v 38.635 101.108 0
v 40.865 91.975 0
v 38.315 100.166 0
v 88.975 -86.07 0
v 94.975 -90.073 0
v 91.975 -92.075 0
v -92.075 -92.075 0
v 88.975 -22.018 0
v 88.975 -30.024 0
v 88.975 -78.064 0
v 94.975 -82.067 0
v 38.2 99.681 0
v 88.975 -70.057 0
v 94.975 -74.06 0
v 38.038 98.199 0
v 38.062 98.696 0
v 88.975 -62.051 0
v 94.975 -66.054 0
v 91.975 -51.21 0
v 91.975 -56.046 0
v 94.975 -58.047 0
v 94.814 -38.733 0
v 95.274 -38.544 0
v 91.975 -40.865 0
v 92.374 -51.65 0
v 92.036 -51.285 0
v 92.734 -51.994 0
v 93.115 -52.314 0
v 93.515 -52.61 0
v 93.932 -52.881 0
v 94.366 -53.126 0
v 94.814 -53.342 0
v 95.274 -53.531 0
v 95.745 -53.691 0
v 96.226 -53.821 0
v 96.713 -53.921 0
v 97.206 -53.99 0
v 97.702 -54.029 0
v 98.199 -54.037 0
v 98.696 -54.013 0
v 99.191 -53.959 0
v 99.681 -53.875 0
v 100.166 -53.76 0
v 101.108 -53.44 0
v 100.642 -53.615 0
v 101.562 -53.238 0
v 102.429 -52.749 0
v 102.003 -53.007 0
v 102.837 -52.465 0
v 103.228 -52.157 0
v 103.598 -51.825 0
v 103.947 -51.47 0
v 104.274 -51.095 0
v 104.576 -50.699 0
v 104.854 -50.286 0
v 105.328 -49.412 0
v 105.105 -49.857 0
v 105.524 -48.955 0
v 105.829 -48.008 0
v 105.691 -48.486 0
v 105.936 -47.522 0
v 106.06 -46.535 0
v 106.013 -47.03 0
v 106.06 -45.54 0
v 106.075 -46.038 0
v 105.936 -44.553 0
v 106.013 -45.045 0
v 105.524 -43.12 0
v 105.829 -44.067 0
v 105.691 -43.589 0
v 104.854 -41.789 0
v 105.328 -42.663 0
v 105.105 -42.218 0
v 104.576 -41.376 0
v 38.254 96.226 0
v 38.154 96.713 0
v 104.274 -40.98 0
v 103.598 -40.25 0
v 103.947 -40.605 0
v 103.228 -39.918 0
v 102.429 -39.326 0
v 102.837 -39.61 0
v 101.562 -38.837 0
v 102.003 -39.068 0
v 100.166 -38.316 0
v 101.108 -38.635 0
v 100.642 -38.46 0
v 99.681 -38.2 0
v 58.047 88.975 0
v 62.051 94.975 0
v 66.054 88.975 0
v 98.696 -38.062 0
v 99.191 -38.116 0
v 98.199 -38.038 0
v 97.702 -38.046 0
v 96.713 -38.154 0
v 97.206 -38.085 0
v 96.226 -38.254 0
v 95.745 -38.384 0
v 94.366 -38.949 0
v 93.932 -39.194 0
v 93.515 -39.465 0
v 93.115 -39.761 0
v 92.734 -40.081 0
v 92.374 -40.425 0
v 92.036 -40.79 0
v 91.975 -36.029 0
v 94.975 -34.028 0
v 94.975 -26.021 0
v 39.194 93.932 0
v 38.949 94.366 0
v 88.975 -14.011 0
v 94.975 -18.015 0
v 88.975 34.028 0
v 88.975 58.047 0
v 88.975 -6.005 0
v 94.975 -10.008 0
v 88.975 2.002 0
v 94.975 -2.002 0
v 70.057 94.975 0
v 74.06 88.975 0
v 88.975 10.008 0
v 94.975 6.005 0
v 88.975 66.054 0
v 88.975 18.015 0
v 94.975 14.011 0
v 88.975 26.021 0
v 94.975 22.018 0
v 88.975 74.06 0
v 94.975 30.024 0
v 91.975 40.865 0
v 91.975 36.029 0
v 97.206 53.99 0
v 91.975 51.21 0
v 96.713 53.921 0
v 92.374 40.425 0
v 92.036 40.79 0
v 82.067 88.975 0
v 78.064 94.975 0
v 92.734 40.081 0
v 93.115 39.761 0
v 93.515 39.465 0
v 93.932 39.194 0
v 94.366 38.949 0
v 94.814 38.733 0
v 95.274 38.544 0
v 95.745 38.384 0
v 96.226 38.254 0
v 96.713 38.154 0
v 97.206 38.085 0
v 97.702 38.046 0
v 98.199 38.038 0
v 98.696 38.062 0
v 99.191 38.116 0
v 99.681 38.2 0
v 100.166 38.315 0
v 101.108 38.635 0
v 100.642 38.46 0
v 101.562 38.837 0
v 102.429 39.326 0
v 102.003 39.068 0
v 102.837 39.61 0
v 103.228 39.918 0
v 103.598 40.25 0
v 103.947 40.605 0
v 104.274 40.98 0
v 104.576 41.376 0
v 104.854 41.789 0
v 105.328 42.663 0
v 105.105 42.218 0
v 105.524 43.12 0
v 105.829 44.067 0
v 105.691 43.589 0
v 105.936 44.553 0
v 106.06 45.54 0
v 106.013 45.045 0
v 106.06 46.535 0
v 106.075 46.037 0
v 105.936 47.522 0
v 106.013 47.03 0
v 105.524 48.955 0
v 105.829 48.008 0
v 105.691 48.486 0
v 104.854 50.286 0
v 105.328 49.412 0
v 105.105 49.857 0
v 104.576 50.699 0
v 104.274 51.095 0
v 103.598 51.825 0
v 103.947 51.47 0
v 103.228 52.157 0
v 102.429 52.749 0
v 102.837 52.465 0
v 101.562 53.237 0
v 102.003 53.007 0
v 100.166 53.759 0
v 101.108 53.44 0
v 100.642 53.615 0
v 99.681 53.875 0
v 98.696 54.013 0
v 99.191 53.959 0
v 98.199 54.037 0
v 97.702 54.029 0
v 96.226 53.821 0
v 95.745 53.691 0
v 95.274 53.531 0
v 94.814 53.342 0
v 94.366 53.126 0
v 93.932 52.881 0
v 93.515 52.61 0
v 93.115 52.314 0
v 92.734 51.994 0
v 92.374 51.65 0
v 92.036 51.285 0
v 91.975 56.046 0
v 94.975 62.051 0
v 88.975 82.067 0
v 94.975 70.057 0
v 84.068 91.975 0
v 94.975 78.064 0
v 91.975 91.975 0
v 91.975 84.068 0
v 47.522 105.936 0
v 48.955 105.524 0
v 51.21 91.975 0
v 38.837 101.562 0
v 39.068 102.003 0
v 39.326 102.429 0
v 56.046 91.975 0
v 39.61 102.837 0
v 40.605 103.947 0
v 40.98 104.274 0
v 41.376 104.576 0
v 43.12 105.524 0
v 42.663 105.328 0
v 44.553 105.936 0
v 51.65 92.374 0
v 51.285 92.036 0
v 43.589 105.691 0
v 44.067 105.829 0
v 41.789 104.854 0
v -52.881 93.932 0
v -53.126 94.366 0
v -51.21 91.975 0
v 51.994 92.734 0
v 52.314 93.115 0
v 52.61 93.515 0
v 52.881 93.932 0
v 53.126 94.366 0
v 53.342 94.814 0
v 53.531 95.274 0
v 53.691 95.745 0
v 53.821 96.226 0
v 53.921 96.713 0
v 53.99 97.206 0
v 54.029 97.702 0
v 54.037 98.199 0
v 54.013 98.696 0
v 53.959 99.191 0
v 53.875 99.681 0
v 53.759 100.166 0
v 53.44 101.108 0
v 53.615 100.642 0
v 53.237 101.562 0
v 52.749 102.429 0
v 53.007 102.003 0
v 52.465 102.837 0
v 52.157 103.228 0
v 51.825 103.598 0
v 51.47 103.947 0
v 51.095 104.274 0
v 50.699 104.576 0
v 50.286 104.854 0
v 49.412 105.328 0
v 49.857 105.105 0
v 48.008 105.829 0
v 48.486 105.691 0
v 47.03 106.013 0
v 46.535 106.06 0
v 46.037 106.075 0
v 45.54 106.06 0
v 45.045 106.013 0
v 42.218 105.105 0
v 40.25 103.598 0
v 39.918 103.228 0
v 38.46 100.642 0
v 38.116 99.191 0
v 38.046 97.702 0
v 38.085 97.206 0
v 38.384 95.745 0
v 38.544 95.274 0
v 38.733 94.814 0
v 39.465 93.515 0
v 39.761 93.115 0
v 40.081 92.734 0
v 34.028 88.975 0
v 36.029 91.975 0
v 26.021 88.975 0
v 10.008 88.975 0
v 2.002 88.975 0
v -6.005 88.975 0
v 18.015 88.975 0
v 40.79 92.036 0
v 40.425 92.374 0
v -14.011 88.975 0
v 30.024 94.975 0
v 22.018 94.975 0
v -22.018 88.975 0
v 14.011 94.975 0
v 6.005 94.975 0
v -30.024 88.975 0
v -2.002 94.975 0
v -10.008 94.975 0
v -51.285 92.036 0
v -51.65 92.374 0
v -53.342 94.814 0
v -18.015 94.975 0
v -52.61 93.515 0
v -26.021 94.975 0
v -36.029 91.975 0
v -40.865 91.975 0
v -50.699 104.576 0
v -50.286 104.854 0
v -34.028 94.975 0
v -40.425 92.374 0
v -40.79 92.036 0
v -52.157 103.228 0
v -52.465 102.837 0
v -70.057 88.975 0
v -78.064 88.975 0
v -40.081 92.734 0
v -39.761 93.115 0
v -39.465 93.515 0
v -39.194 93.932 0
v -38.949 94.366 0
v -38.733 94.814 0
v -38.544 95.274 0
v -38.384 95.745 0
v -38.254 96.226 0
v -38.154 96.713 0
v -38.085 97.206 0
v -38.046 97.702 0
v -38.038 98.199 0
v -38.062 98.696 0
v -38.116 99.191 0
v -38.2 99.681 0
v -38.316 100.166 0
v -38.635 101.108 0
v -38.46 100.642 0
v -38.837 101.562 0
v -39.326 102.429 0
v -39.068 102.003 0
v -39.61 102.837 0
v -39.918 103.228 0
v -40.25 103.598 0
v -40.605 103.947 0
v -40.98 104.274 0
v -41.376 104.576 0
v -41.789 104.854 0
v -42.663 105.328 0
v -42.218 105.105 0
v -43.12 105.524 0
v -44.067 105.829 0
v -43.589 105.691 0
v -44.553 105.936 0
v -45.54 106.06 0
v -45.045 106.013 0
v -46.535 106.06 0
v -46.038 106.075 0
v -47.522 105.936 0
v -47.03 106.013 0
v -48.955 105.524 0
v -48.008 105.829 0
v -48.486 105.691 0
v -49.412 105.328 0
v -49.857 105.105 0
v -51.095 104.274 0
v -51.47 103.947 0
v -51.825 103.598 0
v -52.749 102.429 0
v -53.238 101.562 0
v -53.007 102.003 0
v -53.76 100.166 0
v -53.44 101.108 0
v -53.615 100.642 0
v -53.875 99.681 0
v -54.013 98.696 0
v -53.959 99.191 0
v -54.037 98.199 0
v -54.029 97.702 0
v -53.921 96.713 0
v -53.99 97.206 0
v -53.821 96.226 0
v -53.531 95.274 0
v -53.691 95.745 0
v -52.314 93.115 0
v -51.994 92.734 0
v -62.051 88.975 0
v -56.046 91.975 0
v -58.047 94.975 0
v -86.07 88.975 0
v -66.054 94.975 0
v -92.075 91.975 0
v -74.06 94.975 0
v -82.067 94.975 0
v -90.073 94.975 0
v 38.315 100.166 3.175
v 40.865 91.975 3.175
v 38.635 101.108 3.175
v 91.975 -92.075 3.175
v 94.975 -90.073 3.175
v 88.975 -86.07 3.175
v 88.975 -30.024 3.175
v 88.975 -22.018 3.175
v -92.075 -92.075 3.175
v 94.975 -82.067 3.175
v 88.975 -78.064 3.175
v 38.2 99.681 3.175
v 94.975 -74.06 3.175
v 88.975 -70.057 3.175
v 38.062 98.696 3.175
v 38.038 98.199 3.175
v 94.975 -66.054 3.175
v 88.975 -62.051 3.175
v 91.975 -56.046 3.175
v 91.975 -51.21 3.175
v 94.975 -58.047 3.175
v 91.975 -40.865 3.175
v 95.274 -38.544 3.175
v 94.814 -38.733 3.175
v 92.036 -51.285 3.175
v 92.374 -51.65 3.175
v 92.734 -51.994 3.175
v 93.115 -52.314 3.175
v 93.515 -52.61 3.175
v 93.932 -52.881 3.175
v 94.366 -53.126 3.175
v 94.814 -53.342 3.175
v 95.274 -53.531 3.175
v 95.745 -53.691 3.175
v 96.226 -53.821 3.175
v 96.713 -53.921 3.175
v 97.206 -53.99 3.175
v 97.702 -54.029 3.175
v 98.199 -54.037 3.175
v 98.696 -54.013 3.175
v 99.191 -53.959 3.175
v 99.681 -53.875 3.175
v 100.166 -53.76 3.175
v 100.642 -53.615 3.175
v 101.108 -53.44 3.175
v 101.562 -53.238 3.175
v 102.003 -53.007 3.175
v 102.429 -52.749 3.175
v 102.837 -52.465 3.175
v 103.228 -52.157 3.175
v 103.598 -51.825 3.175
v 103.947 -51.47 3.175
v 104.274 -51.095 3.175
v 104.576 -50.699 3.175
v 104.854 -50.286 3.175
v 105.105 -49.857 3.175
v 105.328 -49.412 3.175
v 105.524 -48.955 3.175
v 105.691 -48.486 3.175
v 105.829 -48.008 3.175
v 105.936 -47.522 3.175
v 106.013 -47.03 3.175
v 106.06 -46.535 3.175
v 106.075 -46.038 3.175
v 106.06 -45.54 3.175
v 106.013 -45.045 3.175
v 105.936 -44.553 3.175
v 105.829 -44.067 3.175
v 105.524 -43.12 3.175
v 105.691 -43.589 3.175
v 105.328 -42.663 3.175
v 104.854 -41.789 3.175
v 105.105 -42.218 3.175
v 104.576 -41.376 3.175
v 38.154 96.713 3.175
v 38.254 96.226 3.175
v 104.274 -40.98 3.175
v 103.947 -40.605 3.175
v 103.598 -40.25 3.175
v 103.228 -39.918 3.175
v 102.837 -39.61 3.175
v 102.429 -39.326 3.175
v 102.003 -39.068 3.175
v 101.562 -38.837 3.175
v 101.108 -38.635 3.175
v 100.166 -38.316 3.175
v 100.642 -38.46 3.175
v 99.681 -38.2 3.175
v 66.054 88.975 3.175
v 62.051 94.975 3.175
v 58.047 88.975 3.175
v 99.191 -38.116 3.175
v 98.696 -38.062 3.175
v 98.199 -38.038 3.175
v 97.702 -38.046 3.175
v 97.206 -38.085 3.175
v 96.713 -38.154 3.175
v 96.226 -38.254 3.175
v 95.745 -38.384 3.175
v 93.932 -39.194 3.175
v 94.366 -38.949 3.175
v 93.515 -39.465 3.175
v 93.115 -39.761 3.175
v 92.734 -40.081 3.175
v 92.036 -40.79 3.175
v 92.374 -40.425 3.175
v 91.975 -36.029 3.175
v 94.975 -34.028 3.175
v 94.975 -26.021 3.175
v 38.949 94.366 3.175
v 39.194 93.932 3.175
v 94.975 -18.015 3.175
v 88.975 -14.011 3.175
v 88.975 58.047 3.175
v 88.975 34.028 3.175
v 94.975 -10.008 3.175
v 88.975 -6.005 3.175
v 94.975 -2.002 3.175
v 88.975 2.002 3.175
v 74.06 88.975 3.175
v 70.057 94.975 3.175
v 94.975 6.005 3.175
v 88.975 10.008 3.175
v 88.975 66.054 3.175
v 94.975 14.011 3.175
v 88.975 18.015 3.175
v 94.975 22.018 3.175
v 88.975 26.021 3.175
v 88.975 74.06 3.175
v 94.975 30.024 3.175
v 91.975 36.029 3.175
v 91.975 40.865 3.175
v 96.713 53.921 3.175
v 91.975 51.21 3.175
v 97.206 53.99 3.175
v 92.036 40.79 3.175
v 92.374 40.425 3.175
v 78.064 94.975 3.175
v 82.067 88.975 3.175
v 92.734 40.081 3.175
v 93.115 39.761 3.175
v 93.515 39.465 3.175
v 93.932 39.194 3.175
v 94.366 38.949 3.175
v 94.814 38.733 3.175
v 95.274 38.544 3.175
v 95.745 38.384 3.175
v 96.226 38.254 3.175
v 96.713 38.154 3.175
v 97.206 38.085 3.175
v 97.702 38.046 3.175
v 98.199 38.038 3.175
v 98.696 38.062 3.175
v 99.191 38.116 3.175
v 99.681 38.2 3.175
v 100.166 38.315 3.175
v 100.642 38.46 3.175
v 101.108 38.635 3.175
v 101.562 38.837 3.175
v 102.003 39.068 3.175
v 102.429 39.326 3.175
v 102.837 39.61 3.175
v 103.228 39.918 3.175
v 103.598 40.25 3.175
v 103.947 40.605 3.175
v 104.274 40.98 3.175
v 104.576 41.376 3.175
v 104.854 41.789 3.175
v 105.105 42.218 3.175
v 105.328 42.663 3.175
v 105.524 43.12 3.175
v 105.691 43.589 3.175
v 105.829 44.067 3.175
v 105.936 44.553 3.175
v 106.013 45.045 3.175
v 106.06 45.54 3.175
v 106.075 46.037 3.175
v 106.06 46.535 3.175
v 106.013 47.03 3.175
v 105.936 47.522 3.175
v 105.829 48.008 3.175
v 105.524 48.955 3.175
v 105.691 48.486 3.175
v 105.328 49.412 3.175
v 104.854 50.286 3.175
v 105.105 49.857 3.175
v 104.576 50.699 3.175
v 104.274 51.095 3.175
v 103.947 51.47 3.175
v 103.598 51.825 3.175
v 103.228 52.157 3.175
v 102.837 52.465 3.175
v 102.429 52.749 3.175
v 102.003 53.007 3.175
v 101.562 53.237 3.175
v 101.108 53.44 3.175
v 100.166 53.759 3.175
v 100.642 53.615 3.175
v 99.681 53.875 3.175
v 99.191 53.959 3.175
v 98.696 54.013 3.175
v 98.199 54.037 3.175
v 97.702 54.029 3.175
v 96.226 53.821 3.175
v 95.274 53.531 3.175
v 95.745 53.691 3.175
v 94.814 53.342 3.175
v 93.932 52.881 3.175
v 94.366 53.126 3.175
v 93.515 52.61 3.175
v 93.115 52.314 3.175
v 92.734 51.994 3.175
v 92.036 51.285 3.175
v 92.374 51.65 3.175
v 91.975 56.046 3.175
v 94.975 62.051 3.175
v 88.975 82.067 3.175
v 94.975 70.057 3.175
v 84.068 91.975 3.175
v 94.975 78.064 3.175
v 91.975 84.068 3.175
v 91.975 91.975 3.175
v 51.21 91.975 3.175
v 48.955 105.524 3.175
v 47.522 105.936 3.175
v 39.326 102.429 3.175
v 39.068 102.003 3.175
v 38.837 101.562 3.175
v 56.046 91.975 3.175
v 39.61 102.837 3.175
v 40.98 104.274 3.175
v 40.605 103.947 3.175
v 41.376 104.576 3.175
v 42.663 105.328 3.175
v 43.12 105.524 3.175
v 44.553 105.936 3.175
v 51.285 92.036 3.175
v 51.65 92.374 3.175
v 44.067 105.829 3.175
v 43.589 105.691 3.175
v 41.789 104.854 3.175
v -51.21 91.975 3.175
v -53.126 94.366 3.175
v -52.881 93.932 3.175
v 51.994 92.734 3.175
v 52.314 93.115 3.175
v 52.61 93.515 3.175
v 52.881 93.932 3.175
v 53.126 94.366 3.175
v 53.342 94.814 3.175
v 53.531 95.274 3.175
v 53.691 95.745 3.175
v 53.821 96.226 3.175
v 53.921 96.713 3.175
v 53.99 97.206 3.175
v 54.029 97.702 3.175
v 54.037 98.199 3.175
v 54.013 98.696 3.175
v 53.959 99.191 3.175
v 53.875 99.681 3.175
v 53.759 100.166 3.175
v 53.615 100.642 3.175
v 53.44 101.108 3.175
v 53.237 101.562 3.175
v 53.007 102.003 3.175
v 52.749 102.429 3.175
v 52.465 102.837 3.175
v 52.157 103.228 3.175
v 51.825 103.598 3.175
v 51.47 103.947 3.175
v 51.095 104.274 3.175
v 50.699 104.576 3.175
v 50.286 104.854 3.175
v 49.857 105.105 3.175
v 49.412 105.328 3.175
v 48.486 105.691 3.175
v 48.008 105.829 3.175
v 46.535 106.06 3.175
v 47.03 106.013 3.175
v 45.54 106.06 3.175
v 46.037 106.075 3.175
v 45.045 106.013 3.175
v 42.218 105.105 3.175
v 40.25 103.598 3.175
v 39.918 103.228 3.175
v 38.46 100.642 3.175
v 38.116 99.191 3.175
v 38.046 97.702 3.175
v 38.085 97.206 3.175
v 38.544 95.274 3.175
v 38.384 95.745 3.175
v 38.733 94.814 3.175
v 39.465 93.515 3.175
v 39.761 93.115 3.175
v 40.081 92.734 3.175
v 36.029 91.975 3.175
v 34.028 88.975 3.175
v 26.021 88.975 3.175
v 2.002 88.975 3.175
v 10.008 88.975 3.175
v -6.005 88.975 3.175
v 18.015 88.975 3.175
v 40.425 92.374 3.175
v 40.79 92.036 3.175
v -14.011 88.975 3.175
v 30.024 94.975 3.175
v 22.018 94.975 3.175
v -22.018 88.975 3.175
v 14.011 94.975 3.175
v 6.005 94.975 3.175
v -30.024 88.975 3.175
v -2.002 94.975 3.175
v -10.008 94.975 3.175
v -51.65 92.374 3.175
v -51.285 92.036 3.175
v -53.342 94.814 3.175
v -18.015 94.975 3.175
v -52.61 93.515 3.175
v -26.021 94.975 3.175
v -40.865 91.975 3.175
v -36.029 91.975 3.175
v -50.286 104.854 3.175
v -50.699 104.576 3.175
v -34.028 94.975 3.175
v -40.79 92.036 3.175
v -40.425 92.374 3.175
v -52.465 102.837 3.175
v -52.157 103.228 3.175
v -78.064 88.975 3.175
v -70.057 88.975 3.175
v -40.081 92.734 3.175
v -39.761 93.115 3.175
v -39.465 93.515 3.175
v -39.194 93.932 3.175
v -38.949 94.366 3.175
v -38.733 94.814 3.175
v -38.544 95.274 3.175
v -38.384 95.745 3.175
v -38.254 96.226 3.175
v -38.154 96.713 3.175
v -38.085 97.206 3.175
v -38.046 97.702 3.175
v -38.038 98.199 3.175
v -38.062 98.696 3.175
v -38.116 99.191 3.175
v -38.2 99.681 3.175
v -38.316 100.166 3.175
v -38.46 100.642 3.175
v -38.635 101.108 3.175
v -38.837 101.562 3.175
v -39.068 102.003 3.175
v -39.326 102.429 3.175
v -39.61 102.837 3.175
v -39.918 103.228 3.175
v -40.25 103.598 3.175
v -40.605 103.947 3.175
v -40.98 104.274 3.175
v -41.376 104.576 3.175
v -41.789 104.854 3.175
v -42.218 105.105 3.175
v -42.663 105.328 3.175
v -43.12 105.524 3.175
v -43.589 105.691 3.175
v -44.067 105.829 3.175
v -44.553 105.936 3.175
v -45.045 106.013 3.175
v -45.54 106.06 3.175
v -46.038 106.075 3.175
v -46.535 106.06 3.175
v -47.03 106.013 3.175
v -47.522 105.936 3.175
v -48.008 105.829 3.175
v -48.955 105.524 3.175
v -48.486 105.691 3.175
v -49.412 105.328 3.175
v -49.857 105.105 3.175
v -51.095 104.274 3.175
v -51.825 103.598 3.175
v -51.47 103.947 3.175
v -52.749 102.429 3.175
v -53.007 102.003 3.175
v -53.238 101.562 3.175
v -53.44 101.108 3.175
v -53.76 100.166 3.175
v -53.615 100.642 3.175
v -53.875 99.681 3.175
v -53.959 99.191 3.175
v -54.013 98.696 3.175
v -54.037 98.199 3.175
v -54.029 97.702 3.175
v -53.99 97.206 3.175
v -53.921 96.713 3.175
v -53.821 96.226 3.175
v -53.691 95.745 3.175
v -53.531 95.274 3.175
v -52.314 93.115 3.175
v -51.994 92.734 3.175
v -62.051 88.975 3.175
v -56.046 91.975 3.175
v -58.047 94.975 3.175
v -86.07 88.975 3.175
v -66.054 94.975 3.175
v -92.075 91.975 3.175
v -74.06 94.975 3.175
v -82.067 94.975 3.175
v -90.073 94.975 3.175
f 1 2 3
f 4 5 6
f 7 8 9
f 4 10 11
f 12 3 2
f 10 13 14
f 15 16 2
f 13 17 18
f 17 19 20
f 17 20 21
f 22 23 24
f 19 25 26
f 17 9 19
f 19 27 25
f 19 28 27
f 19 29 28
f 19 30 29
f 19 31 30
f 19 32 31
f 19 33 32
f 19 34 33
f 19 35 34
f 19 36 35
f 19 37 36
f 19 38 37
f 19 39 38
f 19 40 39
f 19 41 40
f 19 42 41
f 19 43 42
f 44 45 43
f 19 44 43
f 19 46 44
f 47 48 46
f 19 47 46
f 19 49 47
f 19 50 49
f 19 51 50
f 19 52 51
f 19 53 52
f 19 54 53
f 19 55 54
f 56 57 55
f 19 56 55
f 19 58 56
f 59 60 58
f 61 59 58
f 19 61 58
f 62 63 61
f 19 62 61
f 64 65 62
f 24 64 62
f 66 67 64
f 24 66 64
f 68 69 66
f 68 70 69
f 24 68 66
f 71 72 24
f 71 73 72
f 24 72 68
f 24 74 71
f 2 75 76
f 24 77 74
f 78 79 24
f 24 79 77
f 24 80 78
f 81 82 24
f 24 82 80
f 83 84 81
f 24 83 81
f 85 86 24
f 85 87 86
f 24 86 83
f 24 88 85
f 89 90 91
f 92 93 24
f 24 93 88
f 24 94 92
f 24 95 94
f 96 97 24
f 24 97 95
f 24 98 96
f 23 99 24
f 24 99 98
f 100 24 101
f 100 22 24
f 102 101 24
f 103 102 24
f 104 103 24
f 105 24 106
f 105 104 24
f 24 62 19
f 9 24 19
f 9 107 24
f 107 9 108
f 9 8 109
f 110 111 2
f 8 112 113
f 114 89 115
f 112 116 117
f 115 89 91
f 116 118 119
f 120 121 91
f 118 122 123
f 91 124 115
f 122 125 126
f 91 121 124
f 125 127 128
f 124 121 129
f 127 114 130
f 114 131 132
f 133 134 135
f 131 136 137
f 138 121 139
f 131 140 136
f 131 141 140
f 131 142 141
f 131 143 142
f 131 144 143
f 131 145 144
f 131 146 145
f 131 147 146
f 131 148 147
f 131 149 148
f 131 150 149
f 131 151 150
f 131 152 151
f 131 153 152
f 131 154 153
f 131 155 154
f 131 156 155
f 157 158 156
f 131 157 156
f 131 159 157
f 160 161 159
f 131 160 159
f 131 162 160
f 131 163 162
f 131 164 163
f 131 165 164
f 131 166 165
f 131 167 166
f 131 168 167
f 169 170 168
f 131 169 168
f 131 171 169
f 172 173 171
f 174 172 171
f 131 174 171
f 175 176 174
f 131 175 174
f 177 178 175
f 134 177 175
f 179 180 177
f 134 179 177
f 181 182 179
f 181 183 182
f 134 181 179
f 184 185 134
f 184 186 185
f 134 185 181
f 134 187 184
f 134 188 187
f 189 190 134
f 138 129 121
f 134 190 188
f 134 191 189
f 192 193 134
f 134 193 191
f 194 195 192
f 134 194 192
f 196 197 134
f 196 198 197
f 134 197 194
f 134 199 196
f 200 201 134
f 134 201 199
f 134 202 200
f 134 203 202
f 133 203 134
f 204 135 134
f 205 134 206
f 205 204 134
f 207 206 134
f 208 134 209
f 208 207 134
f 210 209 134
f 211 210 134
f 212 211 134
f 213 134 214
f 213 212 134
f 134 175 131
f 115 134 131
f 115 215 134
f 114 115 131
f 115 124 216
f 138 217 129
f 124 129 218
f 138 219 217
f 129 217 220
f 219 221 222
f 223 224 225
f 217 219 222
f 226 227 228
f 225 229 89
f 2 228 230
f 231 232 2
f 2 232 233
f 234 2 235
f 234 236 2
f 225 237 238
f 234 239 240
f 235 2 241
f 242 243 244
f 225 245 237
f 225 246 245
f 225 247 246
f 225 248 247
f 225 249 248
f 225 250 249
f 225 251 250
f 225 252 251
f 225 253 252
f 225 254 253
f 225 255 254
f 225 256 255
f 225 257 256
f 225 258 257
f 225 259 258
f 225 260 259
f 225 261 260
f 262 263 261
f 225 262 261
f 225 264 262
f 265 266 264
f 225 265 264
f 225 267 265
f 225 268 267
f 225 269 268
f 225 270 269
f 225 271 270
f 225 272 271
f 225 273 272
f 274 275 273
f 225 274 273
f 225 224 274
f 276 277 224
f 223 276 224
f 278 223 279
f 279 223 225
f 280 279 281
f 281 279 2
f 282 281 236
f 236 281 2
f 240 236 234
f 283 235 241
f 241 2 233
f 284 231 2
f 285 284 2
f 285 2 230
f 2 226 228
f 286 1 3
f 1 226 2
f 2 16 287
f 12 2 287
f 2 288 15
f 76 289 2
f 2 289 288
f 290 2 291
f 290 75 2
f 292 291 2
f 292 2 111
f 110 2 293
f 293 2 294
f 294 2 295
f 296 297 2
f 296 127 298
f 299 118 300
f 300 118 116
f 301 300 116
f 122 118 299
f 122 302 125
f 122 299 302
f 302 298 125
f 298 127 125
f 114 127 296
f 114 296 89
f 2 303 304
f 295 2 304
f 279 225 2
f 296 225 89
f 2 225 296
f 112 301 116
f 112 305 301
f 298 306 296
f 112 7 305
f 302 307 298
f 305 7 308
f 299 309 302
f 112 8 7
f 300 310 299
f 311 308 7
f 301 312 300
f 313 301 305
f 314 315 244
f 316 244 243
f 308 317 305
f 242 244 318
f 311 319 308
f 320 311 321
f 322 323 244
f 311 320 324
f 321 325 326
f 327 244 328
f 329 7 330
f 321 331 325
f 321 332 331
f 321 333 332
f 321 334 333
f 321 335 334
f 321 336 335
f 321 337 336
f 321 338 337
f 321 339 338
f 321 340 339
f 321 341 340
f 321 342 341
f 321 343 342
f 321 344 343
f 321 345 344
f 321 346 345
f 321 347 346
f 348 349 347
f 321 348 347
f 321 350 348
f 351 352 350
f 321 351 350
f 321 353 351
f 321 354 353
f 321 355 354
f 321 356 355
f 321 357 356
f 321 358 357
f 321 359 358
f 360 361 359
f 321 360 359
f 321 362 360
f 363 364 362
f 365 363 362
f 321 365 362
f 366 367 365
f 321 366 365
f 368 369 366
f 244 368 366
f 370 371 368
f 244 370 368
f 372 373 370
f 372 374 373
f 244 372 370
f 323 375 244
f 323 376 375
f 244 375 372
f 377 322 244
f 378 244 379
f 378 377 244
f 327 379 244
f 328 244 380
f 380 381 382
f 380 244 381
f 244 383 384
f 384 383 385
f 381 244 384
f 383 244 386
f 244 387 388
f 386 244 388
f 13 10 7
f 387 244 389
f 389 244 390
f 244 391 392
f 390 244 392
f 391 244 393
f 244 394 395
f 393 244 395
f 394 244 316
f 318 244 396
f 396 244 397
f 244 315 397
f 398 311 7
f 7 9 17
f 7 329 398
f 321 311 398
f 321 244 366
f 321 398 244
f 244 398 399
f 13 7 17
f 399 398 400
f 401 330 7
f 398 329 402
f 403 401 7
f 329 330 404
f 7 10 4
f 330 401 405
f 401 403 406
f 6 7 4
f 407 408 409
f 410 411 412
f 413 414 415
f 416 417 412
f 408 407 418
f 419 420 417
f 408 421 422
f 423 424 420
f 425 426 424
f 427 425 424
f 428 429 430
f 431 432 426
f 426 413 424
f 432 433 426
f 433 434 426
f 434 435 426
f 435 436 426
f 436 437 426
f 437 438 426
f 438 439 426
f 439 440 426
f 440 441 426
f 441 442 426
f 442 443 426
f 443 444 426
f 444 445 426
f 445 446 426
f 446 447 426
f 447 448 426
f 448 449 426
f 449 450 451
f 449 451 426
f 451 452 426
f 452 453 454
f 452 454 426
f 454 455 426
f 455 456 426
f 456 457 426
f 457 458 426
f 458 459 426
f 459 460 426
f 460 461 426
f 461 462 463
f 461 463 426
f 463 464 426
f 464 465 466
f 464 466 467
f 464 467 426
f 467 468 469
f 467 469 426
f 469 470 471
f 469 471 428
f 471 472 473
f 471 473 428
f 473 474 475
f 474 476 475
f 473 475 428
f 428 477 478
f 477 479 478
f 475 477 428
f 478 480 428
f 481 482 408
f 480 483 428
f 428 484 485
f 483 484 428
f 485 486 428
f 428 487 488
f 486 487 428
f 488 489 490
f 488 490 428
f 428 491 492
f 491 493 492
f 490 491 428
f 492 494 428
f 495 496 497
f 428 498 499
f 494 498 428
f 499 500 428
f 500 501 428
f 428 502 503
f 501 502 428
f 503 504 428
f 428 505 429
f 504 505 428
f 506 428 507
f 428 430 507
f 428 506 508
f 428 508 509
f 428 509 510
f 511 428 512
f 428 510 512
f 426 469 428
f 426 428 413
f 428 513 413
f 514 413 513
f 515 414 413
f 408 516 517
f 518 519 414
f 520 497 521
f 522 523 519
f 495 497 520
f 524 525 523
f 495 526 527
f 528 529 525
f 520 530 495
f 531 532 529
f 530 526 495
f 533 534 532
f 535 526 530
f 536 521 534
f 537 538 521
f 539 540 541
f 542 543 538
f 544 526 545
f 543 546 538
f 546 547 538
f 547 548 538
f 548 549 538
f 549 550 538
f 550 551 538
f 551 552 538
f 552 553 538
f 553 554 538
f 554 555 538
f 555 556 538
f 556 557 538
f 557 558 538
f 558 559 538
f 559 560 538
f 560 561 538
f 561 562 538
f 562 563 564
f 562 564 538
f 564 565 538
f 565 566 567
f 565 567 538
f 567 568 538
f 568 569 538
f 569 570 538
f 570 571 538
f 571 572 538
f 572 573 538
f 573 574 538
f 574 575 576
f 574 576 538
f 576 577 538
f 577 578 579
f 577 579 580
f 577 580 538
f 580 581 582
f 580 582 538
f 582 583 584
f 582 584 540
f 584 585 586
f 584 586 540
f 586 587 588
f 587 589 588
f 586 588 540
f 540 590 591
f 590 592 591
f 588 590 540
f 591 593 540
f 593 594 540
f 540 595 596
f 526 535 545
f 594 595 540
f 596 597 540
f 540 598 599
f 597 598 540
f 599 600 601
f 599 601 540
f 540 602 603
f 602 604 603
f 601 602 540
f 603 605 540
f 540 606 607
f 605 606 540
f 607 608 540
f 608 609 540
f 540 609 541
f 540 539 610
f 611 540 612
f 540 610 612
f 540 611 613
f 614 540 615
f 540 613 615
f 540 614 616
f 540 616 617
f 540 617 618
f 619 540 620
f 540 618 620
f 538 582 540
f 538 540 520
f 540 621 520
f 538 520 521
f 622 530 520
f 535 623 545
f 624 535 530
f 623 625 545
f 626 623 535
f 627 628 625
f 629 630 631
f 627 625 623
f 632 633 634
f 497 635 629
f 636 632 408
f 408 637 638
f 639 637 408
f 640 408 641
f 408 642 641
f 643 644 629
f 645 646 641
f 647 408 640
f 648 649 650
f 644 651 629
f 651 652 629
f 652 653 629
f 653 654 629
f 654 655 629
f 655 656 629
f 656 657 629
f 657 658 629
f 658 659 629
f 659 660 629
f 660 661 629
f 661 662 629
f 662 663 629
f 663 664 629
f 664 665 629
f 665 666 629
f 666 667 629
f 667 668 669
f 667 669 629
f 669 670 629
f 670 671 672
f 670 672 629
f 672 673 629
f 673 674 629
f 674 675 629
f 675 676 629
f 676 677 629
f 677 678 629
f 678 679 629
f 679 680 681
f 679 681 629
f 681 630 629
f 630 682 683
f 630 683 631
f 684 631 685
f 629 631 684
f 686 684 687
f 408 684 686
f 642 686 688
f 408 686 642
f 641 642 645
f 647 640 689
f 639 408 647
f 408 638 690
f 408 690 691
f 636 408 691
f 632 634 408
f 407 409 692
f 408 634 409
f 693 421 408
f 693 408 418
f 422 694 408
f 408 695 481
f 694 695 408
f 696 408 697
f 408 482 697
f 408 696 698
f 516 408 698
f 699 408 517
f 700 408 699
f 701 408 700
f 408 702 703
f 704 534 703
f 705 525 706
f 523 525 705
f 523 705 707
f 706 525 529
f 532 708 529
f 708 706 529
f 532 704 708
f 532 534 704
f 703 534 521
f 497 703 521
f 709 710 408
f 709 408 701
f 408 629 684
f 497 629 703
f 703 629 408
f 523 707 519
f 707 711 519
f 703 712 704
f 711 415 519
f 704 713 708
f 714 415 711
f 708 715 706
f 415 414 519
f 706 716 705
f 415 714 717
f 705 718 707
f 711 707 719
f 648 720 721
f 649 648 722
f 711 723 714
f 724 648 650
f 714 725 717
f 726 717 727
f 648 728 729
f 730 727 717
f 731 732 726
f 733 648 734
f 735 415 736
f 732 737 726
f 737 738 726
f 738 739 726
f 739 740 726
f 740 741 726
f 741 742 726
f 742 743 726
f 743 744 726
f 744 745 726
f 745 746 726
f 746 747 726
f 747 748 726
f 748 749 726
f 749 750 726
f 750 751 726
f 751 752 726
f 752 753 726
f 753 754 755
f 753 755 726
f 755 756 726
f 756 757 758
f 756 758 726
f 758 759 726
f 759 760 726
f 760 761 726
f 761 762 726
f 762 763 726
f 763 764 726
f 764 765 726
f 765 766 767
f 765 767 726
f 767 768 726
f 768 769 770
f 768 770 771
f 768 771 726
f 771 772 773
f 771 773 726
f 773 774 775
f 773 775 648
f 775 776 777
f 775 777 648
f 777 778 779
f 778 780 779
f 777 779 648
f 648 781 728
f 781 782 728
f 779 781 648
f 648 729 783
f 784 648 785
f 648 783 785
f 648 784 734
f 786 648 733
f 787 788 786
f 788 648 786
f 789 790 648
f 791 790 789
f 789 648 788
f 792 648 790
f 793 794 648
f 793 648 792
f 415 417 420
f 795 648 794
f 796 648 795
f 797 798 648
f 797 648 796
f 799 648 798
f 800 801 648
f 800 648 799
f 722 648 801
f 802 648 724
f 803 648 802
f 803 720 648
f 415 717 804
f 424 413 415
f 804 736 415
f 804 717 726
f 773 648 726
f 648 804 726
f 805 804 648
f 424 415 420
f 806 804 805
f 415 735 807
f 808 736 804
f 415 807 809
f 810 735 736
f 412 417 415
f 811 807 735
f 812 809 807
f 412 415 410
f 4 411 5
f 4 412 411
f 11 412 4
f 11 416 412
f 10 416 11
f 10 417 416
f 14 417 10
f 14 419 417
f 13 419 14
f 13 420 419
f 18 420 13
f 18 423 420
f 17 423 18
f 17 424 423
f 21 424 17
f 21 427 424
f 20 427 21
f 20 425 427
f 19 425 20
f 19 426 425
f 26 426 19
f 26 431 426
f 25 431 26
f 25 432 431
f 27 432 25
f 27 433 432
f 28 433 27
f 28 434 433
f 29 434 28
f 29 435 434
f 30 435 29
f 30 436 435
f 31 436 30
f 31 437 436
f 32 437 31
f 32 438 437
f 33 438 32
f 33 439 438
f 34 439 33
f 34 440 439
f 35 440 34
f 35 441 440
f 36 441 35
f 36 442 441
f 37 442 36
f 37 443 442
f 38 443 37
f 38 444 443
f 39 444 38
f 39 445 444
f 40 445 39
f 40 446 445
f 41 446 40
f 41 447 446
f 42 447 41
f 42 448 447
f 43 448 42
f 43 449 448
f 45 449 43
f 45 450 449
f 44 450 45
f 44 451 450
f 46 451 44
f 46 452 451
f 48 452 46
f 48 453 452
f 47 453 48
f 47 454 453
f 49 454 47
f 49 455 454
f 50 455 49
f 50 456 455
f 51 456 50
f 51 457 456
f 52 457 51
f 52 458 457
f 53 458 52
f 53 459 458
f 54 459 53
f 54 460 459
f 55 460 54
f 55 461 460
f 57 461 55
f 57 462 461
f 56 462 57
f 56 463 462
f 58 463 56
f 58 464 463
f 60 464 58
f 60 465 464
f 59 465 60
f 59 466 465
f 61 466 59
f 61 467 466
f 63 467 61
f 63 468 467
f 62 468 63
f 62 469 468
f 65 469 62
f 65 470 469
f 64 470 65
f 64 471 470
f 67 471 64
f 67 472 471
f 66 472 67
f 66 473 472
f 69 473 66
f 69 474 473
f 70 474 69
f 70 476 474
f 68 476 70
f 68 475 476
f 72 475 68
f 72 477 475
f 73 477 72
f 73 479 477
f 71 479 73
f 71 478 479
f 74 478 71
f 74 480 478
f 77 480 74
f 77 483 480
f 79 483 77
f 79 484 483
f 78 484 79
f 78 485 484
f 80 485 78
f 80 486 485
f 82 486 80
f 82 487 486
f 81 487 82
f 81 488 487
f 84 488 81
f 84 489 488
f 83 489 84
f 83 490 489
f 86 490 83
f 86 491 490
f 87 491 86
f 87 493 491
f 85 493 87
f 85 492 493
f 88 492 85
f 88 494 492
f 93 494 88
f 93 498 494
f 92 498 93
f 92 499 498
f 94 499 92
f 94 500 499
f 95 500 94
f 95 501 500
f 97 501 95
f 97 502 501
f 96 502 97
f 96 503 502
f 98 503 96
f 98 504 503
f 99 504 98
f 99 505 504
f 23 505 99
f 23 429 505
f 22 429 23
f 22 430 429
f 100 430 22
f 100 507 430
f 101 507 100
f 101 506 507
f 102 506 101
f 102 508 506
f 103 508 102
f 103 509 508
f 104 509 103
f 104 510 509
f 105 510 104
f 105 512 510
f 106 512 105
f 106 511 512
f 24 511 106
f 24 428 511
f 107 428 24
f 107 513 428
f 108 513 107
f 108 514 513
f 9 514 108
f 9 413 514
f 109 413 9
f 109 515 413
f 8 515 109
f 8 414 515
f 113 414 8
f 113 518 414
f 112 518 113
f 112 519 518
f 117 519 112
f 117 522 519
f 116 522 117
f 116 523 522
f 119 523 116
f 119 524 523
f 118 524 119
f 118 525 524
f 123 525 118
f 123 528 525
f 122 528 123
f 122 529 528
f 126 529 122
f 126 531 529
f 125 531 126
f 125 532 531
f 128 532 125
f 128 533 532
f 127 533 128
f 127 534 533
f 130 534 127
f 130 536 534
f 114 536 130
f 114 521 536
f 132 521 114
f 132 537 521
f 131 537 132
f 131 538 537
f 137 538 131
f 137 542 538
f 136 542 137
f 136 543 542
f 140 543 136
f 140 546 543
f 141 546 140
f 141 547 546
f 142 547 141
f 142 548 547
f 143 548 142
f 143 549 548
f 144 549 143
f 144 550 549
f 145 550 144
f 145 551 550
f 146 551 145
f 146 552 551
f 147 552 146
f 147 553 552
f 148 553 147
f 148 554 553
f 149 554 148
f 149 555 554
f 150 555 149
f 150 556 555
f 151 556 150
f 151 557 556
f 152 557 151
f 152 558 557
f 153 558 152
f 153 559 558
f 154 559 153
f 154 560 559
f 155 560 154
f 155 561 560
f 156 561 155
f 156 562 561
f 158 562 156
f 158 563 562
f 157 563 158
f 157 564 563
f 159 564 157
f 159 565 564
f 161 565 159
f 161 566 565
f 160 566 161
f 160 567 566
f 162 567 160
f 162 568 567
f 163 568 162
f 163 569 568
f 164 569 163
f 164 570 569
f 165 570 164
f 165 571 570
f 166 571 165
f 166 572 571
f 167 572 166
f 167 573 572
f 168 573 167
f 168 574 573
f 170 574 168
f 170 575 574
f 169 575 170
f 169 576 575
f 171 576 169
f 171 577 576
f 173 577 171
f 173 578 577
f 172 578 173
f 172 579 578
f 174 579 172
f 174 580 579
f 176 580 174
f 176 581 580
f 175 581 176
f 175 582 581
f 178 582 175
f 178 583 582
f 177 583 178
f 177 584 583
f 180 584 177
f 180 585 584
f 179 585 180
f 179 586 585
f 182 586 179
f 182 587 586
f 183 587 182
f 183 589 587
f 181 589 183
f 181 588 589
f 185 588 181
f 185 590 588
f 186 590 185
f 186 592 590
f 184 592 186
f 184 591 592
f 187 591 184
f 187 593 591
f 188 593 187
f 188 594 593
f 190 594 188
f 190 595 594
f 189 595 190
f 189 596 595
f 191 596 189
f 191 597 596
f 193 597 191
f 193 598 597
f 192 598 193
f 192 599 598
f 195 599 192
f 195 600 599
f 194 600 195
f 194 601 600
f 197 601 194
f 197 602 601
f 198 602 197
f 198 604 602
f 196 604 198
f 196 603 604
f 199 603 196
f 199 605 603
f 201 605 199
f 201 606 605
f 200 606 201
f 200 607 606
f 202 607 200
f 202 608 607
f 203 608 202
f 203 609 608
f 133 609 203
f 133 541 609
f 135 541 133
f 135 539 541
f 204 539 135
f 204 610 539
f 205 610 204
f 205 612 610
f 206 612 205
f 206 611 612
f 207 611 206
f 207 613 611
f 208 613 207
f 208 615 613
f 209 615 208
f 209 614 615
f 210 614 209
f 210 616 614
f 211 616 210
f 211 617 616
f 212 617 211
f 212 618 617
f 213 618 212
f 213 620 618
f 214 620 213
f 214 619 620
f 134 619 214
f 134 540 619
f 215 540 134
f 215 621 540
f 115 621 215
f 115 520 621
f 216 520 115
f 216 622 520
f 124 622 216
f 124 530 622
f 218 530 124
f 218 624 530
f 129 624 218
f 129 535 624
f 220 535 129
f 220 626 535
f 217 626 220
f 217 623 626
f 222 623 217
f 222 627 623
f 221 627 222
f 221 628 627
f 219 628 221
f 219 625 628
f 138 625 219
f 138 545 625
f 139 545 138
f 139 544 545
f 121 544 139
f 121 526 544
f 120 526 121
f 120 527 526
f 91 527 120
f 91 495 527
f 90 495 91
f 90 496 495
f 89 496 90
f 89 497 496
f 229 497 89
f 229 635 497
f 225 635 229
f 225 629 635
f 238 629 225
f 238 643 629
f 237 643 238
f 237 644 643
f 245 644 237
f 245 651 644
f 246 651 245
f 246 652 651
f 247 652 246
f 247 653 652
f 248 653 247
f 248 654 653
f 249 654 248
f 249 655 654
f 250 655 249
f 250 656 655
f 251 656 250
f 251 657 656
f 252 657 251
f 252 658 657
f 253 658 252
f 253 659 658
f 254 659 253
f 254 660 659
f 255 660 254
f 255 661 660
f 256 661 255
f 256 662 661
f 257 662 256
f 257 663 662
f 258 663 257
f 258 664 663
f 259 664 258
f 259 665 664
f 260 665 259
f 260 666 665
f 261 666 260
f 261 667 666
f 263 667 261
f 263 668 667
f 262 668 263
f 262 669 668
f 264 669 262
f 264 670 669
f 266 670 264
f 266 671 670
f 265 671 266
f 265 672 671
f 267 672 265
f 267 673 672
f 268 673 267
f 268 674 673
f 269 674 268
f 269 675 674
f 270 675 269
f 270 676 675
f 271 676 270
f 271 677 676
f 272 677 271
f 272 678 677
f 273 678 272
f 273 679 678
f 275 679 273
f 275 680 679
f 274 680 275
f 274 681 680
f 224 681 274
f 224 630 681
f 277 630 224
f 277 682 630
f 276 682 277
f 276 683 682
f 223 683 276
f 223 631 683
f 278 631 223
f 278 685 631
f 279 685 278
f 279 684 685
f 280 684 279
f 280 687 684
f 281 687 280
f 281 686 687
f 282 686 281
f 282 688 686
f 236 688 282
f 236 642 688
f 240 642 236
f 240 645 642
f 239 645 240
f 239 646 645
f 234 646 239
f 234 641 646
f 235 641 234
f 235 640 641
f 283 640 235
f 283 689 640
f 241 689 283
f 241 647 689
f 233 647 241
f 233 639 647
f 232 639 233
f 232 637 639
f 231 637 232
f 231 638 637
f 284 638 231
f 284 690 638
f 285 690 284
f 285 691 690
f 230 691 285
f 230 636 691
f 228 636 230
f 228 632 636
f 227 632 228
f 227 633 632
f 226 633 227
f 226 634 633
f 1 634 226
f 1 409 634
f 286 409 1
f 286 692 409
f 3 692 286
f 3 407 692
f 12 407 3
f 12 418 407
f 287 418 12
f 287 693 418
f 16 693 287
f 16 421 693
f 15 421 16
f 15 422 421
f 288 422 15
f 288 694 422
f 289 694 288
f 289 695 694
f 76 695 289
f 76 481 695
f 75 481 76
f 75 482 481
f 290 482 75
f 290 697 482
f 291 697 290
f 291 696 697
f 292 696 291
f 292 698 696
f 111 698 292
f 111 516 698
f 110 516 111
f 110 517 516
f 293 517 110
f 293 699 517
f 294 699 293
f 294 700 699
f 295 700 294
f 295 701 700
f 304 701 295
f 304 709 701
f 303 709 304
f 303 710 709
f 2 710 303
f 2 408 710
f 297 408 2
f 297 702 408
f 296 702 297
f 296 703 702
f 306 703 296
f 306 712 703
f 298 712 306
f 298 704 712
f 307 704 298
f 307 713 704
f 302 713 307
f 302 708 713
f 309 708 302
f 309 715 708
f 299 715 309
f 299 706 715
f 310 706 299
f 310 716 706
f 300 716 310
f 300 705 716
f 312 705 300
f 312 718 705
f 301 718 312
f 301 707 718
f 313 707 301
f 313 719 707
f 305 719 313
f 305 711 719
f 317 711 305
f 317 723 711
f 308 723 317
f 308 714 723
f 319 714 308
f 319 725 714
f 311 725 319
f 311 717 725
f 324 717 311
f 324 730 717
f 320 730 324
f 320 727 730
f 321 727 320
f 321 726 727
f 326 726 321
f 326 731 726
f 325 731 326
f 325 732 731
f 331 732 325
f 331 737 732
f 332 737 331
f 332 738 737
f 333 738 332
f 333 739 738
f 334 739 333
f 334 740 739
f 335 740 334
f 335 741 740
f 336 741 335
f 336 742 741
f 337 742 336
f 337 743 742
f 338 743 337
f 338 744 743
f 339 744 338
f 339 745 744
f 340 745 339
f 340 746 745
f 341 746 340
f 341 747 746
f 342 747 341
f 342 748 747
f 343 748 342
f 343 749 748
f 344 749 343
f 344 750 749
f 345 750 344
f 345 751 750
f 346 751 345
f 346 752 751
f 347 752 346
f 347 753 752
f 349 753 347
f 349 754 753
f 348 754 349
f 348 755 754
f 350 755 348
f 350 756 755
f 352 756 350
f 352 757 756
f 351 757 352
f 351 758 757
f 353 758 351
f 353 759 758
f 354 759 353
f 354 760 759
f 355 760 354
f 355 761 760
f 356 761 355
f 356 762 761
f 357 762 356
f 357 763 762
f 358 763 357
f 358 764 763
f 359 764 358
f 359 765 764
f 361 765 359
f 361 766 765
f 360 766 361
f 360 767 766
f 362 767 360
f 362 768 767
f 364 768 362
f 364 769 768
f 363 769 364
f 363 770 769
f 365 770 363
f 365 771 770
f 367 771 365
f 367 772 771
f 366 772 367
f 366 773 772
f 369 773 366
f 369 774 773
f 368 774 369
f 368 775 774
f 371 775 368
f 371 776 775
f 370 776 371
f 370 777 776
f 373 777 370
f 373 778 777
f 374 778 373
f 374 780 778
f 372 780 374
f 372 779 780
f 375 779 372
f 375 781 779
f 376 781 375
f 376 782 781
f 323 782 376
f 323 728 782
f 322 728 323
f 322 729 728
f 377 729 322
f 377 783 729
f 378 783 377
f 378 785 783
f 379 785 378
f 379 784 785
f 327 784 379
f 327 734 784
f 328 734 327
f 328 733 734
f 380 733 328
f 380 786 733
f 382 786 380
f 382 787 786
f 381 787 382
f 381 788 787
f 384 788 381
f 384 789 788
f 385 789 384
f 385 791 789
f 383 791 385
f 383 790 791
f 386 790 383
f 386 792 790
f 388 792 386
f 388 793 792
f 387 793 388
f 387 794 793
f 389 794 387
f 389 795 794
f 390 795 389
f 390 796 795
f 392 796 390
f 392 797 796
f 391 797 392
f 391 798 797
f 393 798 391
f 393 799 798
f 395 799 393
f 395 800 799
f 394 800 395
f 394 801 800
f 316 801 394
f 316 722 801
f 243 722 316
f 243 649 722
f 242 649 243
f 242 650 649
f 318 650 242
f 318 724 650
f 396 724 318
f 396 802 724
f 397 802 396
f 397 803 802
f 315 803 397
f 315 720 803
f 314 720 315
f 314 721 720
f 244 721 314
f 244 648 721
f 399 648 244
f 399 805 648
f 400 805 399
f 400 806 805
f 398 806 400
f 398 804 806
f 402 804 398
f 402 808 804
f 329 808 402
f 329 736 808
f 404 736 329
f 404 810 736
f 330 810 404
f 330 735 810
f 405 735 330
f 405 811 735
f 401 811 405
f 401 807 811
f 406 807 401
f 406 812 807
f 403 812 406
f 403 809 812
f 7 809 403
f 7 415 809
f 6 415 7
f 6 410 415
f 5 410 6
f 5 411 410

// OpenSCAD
/* =====================================================
   Square Plate — puzzle-split (solid)
   =====================================================
   A 14.5" square plate too big for the bed, split into a
   grid of tiles. Seams are zigzagged for extra glue
   surface (~1.8× a straight cut), with jigsaw knobs on
   flat lands to lock alignment. Print each tile, press
   the knobs together, and glue (CA or plastic cement on
   the seams).

   Overall side : 14.5 in  (368.3 mm)
   Thickness    : 1/8 in   (  3.175 mm)
   Grid         : 2 × 2 → tiles are 7.25 in (184.15 mm)
                  square, ~198 mm max with knobs.

   Each tile is a preset in square_plate_puzzle.json
   (tile_col / tile_row). Knobs always point +X / +Y, so
   the front-left tile is all knobs and the back-right
   tile is all sockets.

   Prints flat on the bed, no supports.
   ===================================================== */

$fa = 2;
$fs = 0.5;

in = 25.4;   // mm per inch

/* ── Tile selection (set by presets) ─────────────────── */
tile_col = 0;   // 0 = left (-X)
tile_row = 0;   // 0 = front (-Y)

/* ── Dimensions (inches) ─────────────────────────────── */
side_in      = 14.5;     // assembled square edge length
thickness_in = 1/8;      // plate thickness

/* ── Grid ────────────────────────────────────────────── */
cols = 2;
rows = 2;

/* ── Jigsaw knob (mm) ────────────────────────────────── */
knob_d       = 16;       // head diameter
knob_reach   = 14;       // how far the head sticks past the seam
neck_w       = 9;        // neck width (narrower than head = lock)
knobs_per_edge = 2;      // knobs along each tile edge
clearance    = 0.15;     // per-side gap between knob and socket

/* ── Zigzag seam (mm) ────────────────────────────────── */
zig_pitch    = 8;        // target tooth pitch (fitted to the side)
zig_depth    = 6;        // peak-to-peak tooth depth
seam_gap     = 0.2;      // total gap across the zigzag (glue line)
knob_land    = 10;       // flat half-width around each knob

/* ── Derived (mm) ────────────────────────────────────── */
S  = side_in      * in;
Z  = thickness_in * in;
TW = S / cols;
TH = S / rows;
P  = S / round(S / zig_pitch);   // whole teeth along each seam
Q  = P / 4;                      // sample step: zero, peak, zero, trough

// Knob positions along an edge, as fractions of the tile edge.
function knob_fracs() = [for (k = [0 : knobs_per_edge - 1]) (k + 0.5) / knobs_per_edge];

// Flat lands along a seam: around each knob, and where the seams
// of the other direction cross (so their teeth don't collide).
// Edges snap outward to zero crossings, so the zigzag meets them flat.
function snap_land(c, w) = [floor((c - w) / (2 * Q)) * 2 * Q,
                            ceil ((c + w) / (2 * Q)) * 2 * Q];
function seam_lands(n, T) = concat(
    [for (j = [0 : n - 1], f = knob_fracs()) snap_land((j + f) * T, knob_land)],
    [for (j = [1 : n - 1]) snap_land(j * T, zig_depth)]);

function in_land(t, lands) = len([for (l = lands) if (t > l[0] - 0.01 && t < l[1] + 0.01) 1]) > 0;

// Zigzag offset across the seam at sample k (t = k * Q).
function zig(k, lands) =
    in_land(k * Q, lands) ? 0 : [0, zig_depth / 2, 0, -zig_depth / 2][k % 4];

// Seam profile as [along, across] points, padded past both ends.
function seam_pts(lands) = concat(
    [[-1, 0]],
    [for (k = [0 : round(S / Q)]) [k * Q, zig(k, lands)]],
    [[S + 1, 0]]);

// Region on the low side (-across) of a seam at `pos`, pulled back
// by half the glue gap. `hi = true` gives the high side instead.
module seam_side(pos, n, T, hi) {
    pts = seam_pts(seam_lands(n, T));
    g = hi ? seam_gap / 2 : -seam_gap / 2;
    far = hi ? S + 1 : -1;
    polygon(concat(
        [for (p = pts) [p[0], pos + g + p[1]]],
        [[S + 1, far], [-1, far]]));
}

// Swap X/Y so a seam profile built along X runs along Y.
module along_y() { multmatrix([[0, 1, 0, 0], [1, 0, 0, 0], [0, 0, 1, 0]]) children(); }

// One knob on the seam at the origin, pointing +X.
module knob_2d() {
    head_c = knob_reach - knob_d / 2;
    translate([head_c, 0]) circle(d = knob_d);
    // Neck starts slightly behind the seam so it fuses with the tile.
    translate([-1, -neck_w / 2]) square([head_c + 1, neck_w]);
}

// Knobs owned by tile (i, j): on its +X edge and +Y edge.
module owned_knobs(i, j) {
    if (i < cols - 1)
        for (f = knob_fracs())
            translate([(i + 1) * TW, (j + f) * TH]) knob_2d();
    if (j < rows - 1)
        for (f = knob_fracs())
            translate([(i + f) * TW, (j + 1) * TH]) rotate(90) knob_2d();
}

// Tile (i, j) body between its four seams (outer edges are straight).
module tile_cell(i, j) {
    intersection() {
        // Vertical seams run along Y, so build them along X and swap.
        // Missing seams fall back to the full square: an empty child
        // would empty the whole intersection.
        if (i > 0)        along_y() seam_side(i * TW, rows, TH, true);
        else              square([S, S]);
        if (i < cols - 1) along_y() seam_side((i + 1) * TW, rows, TH, false);
        else              square([S, S]);
        if (j > 0)        seam_side(j * TH, cols, TW, true);
        else              square([S, S]);
        if (j < rows - 1) seam_side((j + 1) * TH, cols, TW, false);
        else              square([S, S]);
    }
}

// Tile (i, j) outline in assembled (global) coordinates,
// square spanning [0, S] × [0, S].
module tile_2d(i, j) {
    intersection() {
        square([S, S]);
        difference() {
            union() {
                tile_cell(i, j);
                owned_knobs(i, j);
            }
            // Sockets for the neighbours' knobs, opened up by clearance.
            offset(delta = clearance) {
                if (i > 0) owned_knobs(i - 1, j);
                if (j > 0) owned_knobs(i, j - 1);
            }
        }
    }
}

// Tile (i, j) in assembled position, sitting on Z = 0.
module tile(i, j) {
    linear_extrude(height = Z) tile_2d(i, j);
}

// Selected tile, centred on X/Y for printing.
translate([-(tile_col + 0.5) * TW, -(tile_row + 0.5) * TH, 0])
    tile(tile_col, tile_row);
